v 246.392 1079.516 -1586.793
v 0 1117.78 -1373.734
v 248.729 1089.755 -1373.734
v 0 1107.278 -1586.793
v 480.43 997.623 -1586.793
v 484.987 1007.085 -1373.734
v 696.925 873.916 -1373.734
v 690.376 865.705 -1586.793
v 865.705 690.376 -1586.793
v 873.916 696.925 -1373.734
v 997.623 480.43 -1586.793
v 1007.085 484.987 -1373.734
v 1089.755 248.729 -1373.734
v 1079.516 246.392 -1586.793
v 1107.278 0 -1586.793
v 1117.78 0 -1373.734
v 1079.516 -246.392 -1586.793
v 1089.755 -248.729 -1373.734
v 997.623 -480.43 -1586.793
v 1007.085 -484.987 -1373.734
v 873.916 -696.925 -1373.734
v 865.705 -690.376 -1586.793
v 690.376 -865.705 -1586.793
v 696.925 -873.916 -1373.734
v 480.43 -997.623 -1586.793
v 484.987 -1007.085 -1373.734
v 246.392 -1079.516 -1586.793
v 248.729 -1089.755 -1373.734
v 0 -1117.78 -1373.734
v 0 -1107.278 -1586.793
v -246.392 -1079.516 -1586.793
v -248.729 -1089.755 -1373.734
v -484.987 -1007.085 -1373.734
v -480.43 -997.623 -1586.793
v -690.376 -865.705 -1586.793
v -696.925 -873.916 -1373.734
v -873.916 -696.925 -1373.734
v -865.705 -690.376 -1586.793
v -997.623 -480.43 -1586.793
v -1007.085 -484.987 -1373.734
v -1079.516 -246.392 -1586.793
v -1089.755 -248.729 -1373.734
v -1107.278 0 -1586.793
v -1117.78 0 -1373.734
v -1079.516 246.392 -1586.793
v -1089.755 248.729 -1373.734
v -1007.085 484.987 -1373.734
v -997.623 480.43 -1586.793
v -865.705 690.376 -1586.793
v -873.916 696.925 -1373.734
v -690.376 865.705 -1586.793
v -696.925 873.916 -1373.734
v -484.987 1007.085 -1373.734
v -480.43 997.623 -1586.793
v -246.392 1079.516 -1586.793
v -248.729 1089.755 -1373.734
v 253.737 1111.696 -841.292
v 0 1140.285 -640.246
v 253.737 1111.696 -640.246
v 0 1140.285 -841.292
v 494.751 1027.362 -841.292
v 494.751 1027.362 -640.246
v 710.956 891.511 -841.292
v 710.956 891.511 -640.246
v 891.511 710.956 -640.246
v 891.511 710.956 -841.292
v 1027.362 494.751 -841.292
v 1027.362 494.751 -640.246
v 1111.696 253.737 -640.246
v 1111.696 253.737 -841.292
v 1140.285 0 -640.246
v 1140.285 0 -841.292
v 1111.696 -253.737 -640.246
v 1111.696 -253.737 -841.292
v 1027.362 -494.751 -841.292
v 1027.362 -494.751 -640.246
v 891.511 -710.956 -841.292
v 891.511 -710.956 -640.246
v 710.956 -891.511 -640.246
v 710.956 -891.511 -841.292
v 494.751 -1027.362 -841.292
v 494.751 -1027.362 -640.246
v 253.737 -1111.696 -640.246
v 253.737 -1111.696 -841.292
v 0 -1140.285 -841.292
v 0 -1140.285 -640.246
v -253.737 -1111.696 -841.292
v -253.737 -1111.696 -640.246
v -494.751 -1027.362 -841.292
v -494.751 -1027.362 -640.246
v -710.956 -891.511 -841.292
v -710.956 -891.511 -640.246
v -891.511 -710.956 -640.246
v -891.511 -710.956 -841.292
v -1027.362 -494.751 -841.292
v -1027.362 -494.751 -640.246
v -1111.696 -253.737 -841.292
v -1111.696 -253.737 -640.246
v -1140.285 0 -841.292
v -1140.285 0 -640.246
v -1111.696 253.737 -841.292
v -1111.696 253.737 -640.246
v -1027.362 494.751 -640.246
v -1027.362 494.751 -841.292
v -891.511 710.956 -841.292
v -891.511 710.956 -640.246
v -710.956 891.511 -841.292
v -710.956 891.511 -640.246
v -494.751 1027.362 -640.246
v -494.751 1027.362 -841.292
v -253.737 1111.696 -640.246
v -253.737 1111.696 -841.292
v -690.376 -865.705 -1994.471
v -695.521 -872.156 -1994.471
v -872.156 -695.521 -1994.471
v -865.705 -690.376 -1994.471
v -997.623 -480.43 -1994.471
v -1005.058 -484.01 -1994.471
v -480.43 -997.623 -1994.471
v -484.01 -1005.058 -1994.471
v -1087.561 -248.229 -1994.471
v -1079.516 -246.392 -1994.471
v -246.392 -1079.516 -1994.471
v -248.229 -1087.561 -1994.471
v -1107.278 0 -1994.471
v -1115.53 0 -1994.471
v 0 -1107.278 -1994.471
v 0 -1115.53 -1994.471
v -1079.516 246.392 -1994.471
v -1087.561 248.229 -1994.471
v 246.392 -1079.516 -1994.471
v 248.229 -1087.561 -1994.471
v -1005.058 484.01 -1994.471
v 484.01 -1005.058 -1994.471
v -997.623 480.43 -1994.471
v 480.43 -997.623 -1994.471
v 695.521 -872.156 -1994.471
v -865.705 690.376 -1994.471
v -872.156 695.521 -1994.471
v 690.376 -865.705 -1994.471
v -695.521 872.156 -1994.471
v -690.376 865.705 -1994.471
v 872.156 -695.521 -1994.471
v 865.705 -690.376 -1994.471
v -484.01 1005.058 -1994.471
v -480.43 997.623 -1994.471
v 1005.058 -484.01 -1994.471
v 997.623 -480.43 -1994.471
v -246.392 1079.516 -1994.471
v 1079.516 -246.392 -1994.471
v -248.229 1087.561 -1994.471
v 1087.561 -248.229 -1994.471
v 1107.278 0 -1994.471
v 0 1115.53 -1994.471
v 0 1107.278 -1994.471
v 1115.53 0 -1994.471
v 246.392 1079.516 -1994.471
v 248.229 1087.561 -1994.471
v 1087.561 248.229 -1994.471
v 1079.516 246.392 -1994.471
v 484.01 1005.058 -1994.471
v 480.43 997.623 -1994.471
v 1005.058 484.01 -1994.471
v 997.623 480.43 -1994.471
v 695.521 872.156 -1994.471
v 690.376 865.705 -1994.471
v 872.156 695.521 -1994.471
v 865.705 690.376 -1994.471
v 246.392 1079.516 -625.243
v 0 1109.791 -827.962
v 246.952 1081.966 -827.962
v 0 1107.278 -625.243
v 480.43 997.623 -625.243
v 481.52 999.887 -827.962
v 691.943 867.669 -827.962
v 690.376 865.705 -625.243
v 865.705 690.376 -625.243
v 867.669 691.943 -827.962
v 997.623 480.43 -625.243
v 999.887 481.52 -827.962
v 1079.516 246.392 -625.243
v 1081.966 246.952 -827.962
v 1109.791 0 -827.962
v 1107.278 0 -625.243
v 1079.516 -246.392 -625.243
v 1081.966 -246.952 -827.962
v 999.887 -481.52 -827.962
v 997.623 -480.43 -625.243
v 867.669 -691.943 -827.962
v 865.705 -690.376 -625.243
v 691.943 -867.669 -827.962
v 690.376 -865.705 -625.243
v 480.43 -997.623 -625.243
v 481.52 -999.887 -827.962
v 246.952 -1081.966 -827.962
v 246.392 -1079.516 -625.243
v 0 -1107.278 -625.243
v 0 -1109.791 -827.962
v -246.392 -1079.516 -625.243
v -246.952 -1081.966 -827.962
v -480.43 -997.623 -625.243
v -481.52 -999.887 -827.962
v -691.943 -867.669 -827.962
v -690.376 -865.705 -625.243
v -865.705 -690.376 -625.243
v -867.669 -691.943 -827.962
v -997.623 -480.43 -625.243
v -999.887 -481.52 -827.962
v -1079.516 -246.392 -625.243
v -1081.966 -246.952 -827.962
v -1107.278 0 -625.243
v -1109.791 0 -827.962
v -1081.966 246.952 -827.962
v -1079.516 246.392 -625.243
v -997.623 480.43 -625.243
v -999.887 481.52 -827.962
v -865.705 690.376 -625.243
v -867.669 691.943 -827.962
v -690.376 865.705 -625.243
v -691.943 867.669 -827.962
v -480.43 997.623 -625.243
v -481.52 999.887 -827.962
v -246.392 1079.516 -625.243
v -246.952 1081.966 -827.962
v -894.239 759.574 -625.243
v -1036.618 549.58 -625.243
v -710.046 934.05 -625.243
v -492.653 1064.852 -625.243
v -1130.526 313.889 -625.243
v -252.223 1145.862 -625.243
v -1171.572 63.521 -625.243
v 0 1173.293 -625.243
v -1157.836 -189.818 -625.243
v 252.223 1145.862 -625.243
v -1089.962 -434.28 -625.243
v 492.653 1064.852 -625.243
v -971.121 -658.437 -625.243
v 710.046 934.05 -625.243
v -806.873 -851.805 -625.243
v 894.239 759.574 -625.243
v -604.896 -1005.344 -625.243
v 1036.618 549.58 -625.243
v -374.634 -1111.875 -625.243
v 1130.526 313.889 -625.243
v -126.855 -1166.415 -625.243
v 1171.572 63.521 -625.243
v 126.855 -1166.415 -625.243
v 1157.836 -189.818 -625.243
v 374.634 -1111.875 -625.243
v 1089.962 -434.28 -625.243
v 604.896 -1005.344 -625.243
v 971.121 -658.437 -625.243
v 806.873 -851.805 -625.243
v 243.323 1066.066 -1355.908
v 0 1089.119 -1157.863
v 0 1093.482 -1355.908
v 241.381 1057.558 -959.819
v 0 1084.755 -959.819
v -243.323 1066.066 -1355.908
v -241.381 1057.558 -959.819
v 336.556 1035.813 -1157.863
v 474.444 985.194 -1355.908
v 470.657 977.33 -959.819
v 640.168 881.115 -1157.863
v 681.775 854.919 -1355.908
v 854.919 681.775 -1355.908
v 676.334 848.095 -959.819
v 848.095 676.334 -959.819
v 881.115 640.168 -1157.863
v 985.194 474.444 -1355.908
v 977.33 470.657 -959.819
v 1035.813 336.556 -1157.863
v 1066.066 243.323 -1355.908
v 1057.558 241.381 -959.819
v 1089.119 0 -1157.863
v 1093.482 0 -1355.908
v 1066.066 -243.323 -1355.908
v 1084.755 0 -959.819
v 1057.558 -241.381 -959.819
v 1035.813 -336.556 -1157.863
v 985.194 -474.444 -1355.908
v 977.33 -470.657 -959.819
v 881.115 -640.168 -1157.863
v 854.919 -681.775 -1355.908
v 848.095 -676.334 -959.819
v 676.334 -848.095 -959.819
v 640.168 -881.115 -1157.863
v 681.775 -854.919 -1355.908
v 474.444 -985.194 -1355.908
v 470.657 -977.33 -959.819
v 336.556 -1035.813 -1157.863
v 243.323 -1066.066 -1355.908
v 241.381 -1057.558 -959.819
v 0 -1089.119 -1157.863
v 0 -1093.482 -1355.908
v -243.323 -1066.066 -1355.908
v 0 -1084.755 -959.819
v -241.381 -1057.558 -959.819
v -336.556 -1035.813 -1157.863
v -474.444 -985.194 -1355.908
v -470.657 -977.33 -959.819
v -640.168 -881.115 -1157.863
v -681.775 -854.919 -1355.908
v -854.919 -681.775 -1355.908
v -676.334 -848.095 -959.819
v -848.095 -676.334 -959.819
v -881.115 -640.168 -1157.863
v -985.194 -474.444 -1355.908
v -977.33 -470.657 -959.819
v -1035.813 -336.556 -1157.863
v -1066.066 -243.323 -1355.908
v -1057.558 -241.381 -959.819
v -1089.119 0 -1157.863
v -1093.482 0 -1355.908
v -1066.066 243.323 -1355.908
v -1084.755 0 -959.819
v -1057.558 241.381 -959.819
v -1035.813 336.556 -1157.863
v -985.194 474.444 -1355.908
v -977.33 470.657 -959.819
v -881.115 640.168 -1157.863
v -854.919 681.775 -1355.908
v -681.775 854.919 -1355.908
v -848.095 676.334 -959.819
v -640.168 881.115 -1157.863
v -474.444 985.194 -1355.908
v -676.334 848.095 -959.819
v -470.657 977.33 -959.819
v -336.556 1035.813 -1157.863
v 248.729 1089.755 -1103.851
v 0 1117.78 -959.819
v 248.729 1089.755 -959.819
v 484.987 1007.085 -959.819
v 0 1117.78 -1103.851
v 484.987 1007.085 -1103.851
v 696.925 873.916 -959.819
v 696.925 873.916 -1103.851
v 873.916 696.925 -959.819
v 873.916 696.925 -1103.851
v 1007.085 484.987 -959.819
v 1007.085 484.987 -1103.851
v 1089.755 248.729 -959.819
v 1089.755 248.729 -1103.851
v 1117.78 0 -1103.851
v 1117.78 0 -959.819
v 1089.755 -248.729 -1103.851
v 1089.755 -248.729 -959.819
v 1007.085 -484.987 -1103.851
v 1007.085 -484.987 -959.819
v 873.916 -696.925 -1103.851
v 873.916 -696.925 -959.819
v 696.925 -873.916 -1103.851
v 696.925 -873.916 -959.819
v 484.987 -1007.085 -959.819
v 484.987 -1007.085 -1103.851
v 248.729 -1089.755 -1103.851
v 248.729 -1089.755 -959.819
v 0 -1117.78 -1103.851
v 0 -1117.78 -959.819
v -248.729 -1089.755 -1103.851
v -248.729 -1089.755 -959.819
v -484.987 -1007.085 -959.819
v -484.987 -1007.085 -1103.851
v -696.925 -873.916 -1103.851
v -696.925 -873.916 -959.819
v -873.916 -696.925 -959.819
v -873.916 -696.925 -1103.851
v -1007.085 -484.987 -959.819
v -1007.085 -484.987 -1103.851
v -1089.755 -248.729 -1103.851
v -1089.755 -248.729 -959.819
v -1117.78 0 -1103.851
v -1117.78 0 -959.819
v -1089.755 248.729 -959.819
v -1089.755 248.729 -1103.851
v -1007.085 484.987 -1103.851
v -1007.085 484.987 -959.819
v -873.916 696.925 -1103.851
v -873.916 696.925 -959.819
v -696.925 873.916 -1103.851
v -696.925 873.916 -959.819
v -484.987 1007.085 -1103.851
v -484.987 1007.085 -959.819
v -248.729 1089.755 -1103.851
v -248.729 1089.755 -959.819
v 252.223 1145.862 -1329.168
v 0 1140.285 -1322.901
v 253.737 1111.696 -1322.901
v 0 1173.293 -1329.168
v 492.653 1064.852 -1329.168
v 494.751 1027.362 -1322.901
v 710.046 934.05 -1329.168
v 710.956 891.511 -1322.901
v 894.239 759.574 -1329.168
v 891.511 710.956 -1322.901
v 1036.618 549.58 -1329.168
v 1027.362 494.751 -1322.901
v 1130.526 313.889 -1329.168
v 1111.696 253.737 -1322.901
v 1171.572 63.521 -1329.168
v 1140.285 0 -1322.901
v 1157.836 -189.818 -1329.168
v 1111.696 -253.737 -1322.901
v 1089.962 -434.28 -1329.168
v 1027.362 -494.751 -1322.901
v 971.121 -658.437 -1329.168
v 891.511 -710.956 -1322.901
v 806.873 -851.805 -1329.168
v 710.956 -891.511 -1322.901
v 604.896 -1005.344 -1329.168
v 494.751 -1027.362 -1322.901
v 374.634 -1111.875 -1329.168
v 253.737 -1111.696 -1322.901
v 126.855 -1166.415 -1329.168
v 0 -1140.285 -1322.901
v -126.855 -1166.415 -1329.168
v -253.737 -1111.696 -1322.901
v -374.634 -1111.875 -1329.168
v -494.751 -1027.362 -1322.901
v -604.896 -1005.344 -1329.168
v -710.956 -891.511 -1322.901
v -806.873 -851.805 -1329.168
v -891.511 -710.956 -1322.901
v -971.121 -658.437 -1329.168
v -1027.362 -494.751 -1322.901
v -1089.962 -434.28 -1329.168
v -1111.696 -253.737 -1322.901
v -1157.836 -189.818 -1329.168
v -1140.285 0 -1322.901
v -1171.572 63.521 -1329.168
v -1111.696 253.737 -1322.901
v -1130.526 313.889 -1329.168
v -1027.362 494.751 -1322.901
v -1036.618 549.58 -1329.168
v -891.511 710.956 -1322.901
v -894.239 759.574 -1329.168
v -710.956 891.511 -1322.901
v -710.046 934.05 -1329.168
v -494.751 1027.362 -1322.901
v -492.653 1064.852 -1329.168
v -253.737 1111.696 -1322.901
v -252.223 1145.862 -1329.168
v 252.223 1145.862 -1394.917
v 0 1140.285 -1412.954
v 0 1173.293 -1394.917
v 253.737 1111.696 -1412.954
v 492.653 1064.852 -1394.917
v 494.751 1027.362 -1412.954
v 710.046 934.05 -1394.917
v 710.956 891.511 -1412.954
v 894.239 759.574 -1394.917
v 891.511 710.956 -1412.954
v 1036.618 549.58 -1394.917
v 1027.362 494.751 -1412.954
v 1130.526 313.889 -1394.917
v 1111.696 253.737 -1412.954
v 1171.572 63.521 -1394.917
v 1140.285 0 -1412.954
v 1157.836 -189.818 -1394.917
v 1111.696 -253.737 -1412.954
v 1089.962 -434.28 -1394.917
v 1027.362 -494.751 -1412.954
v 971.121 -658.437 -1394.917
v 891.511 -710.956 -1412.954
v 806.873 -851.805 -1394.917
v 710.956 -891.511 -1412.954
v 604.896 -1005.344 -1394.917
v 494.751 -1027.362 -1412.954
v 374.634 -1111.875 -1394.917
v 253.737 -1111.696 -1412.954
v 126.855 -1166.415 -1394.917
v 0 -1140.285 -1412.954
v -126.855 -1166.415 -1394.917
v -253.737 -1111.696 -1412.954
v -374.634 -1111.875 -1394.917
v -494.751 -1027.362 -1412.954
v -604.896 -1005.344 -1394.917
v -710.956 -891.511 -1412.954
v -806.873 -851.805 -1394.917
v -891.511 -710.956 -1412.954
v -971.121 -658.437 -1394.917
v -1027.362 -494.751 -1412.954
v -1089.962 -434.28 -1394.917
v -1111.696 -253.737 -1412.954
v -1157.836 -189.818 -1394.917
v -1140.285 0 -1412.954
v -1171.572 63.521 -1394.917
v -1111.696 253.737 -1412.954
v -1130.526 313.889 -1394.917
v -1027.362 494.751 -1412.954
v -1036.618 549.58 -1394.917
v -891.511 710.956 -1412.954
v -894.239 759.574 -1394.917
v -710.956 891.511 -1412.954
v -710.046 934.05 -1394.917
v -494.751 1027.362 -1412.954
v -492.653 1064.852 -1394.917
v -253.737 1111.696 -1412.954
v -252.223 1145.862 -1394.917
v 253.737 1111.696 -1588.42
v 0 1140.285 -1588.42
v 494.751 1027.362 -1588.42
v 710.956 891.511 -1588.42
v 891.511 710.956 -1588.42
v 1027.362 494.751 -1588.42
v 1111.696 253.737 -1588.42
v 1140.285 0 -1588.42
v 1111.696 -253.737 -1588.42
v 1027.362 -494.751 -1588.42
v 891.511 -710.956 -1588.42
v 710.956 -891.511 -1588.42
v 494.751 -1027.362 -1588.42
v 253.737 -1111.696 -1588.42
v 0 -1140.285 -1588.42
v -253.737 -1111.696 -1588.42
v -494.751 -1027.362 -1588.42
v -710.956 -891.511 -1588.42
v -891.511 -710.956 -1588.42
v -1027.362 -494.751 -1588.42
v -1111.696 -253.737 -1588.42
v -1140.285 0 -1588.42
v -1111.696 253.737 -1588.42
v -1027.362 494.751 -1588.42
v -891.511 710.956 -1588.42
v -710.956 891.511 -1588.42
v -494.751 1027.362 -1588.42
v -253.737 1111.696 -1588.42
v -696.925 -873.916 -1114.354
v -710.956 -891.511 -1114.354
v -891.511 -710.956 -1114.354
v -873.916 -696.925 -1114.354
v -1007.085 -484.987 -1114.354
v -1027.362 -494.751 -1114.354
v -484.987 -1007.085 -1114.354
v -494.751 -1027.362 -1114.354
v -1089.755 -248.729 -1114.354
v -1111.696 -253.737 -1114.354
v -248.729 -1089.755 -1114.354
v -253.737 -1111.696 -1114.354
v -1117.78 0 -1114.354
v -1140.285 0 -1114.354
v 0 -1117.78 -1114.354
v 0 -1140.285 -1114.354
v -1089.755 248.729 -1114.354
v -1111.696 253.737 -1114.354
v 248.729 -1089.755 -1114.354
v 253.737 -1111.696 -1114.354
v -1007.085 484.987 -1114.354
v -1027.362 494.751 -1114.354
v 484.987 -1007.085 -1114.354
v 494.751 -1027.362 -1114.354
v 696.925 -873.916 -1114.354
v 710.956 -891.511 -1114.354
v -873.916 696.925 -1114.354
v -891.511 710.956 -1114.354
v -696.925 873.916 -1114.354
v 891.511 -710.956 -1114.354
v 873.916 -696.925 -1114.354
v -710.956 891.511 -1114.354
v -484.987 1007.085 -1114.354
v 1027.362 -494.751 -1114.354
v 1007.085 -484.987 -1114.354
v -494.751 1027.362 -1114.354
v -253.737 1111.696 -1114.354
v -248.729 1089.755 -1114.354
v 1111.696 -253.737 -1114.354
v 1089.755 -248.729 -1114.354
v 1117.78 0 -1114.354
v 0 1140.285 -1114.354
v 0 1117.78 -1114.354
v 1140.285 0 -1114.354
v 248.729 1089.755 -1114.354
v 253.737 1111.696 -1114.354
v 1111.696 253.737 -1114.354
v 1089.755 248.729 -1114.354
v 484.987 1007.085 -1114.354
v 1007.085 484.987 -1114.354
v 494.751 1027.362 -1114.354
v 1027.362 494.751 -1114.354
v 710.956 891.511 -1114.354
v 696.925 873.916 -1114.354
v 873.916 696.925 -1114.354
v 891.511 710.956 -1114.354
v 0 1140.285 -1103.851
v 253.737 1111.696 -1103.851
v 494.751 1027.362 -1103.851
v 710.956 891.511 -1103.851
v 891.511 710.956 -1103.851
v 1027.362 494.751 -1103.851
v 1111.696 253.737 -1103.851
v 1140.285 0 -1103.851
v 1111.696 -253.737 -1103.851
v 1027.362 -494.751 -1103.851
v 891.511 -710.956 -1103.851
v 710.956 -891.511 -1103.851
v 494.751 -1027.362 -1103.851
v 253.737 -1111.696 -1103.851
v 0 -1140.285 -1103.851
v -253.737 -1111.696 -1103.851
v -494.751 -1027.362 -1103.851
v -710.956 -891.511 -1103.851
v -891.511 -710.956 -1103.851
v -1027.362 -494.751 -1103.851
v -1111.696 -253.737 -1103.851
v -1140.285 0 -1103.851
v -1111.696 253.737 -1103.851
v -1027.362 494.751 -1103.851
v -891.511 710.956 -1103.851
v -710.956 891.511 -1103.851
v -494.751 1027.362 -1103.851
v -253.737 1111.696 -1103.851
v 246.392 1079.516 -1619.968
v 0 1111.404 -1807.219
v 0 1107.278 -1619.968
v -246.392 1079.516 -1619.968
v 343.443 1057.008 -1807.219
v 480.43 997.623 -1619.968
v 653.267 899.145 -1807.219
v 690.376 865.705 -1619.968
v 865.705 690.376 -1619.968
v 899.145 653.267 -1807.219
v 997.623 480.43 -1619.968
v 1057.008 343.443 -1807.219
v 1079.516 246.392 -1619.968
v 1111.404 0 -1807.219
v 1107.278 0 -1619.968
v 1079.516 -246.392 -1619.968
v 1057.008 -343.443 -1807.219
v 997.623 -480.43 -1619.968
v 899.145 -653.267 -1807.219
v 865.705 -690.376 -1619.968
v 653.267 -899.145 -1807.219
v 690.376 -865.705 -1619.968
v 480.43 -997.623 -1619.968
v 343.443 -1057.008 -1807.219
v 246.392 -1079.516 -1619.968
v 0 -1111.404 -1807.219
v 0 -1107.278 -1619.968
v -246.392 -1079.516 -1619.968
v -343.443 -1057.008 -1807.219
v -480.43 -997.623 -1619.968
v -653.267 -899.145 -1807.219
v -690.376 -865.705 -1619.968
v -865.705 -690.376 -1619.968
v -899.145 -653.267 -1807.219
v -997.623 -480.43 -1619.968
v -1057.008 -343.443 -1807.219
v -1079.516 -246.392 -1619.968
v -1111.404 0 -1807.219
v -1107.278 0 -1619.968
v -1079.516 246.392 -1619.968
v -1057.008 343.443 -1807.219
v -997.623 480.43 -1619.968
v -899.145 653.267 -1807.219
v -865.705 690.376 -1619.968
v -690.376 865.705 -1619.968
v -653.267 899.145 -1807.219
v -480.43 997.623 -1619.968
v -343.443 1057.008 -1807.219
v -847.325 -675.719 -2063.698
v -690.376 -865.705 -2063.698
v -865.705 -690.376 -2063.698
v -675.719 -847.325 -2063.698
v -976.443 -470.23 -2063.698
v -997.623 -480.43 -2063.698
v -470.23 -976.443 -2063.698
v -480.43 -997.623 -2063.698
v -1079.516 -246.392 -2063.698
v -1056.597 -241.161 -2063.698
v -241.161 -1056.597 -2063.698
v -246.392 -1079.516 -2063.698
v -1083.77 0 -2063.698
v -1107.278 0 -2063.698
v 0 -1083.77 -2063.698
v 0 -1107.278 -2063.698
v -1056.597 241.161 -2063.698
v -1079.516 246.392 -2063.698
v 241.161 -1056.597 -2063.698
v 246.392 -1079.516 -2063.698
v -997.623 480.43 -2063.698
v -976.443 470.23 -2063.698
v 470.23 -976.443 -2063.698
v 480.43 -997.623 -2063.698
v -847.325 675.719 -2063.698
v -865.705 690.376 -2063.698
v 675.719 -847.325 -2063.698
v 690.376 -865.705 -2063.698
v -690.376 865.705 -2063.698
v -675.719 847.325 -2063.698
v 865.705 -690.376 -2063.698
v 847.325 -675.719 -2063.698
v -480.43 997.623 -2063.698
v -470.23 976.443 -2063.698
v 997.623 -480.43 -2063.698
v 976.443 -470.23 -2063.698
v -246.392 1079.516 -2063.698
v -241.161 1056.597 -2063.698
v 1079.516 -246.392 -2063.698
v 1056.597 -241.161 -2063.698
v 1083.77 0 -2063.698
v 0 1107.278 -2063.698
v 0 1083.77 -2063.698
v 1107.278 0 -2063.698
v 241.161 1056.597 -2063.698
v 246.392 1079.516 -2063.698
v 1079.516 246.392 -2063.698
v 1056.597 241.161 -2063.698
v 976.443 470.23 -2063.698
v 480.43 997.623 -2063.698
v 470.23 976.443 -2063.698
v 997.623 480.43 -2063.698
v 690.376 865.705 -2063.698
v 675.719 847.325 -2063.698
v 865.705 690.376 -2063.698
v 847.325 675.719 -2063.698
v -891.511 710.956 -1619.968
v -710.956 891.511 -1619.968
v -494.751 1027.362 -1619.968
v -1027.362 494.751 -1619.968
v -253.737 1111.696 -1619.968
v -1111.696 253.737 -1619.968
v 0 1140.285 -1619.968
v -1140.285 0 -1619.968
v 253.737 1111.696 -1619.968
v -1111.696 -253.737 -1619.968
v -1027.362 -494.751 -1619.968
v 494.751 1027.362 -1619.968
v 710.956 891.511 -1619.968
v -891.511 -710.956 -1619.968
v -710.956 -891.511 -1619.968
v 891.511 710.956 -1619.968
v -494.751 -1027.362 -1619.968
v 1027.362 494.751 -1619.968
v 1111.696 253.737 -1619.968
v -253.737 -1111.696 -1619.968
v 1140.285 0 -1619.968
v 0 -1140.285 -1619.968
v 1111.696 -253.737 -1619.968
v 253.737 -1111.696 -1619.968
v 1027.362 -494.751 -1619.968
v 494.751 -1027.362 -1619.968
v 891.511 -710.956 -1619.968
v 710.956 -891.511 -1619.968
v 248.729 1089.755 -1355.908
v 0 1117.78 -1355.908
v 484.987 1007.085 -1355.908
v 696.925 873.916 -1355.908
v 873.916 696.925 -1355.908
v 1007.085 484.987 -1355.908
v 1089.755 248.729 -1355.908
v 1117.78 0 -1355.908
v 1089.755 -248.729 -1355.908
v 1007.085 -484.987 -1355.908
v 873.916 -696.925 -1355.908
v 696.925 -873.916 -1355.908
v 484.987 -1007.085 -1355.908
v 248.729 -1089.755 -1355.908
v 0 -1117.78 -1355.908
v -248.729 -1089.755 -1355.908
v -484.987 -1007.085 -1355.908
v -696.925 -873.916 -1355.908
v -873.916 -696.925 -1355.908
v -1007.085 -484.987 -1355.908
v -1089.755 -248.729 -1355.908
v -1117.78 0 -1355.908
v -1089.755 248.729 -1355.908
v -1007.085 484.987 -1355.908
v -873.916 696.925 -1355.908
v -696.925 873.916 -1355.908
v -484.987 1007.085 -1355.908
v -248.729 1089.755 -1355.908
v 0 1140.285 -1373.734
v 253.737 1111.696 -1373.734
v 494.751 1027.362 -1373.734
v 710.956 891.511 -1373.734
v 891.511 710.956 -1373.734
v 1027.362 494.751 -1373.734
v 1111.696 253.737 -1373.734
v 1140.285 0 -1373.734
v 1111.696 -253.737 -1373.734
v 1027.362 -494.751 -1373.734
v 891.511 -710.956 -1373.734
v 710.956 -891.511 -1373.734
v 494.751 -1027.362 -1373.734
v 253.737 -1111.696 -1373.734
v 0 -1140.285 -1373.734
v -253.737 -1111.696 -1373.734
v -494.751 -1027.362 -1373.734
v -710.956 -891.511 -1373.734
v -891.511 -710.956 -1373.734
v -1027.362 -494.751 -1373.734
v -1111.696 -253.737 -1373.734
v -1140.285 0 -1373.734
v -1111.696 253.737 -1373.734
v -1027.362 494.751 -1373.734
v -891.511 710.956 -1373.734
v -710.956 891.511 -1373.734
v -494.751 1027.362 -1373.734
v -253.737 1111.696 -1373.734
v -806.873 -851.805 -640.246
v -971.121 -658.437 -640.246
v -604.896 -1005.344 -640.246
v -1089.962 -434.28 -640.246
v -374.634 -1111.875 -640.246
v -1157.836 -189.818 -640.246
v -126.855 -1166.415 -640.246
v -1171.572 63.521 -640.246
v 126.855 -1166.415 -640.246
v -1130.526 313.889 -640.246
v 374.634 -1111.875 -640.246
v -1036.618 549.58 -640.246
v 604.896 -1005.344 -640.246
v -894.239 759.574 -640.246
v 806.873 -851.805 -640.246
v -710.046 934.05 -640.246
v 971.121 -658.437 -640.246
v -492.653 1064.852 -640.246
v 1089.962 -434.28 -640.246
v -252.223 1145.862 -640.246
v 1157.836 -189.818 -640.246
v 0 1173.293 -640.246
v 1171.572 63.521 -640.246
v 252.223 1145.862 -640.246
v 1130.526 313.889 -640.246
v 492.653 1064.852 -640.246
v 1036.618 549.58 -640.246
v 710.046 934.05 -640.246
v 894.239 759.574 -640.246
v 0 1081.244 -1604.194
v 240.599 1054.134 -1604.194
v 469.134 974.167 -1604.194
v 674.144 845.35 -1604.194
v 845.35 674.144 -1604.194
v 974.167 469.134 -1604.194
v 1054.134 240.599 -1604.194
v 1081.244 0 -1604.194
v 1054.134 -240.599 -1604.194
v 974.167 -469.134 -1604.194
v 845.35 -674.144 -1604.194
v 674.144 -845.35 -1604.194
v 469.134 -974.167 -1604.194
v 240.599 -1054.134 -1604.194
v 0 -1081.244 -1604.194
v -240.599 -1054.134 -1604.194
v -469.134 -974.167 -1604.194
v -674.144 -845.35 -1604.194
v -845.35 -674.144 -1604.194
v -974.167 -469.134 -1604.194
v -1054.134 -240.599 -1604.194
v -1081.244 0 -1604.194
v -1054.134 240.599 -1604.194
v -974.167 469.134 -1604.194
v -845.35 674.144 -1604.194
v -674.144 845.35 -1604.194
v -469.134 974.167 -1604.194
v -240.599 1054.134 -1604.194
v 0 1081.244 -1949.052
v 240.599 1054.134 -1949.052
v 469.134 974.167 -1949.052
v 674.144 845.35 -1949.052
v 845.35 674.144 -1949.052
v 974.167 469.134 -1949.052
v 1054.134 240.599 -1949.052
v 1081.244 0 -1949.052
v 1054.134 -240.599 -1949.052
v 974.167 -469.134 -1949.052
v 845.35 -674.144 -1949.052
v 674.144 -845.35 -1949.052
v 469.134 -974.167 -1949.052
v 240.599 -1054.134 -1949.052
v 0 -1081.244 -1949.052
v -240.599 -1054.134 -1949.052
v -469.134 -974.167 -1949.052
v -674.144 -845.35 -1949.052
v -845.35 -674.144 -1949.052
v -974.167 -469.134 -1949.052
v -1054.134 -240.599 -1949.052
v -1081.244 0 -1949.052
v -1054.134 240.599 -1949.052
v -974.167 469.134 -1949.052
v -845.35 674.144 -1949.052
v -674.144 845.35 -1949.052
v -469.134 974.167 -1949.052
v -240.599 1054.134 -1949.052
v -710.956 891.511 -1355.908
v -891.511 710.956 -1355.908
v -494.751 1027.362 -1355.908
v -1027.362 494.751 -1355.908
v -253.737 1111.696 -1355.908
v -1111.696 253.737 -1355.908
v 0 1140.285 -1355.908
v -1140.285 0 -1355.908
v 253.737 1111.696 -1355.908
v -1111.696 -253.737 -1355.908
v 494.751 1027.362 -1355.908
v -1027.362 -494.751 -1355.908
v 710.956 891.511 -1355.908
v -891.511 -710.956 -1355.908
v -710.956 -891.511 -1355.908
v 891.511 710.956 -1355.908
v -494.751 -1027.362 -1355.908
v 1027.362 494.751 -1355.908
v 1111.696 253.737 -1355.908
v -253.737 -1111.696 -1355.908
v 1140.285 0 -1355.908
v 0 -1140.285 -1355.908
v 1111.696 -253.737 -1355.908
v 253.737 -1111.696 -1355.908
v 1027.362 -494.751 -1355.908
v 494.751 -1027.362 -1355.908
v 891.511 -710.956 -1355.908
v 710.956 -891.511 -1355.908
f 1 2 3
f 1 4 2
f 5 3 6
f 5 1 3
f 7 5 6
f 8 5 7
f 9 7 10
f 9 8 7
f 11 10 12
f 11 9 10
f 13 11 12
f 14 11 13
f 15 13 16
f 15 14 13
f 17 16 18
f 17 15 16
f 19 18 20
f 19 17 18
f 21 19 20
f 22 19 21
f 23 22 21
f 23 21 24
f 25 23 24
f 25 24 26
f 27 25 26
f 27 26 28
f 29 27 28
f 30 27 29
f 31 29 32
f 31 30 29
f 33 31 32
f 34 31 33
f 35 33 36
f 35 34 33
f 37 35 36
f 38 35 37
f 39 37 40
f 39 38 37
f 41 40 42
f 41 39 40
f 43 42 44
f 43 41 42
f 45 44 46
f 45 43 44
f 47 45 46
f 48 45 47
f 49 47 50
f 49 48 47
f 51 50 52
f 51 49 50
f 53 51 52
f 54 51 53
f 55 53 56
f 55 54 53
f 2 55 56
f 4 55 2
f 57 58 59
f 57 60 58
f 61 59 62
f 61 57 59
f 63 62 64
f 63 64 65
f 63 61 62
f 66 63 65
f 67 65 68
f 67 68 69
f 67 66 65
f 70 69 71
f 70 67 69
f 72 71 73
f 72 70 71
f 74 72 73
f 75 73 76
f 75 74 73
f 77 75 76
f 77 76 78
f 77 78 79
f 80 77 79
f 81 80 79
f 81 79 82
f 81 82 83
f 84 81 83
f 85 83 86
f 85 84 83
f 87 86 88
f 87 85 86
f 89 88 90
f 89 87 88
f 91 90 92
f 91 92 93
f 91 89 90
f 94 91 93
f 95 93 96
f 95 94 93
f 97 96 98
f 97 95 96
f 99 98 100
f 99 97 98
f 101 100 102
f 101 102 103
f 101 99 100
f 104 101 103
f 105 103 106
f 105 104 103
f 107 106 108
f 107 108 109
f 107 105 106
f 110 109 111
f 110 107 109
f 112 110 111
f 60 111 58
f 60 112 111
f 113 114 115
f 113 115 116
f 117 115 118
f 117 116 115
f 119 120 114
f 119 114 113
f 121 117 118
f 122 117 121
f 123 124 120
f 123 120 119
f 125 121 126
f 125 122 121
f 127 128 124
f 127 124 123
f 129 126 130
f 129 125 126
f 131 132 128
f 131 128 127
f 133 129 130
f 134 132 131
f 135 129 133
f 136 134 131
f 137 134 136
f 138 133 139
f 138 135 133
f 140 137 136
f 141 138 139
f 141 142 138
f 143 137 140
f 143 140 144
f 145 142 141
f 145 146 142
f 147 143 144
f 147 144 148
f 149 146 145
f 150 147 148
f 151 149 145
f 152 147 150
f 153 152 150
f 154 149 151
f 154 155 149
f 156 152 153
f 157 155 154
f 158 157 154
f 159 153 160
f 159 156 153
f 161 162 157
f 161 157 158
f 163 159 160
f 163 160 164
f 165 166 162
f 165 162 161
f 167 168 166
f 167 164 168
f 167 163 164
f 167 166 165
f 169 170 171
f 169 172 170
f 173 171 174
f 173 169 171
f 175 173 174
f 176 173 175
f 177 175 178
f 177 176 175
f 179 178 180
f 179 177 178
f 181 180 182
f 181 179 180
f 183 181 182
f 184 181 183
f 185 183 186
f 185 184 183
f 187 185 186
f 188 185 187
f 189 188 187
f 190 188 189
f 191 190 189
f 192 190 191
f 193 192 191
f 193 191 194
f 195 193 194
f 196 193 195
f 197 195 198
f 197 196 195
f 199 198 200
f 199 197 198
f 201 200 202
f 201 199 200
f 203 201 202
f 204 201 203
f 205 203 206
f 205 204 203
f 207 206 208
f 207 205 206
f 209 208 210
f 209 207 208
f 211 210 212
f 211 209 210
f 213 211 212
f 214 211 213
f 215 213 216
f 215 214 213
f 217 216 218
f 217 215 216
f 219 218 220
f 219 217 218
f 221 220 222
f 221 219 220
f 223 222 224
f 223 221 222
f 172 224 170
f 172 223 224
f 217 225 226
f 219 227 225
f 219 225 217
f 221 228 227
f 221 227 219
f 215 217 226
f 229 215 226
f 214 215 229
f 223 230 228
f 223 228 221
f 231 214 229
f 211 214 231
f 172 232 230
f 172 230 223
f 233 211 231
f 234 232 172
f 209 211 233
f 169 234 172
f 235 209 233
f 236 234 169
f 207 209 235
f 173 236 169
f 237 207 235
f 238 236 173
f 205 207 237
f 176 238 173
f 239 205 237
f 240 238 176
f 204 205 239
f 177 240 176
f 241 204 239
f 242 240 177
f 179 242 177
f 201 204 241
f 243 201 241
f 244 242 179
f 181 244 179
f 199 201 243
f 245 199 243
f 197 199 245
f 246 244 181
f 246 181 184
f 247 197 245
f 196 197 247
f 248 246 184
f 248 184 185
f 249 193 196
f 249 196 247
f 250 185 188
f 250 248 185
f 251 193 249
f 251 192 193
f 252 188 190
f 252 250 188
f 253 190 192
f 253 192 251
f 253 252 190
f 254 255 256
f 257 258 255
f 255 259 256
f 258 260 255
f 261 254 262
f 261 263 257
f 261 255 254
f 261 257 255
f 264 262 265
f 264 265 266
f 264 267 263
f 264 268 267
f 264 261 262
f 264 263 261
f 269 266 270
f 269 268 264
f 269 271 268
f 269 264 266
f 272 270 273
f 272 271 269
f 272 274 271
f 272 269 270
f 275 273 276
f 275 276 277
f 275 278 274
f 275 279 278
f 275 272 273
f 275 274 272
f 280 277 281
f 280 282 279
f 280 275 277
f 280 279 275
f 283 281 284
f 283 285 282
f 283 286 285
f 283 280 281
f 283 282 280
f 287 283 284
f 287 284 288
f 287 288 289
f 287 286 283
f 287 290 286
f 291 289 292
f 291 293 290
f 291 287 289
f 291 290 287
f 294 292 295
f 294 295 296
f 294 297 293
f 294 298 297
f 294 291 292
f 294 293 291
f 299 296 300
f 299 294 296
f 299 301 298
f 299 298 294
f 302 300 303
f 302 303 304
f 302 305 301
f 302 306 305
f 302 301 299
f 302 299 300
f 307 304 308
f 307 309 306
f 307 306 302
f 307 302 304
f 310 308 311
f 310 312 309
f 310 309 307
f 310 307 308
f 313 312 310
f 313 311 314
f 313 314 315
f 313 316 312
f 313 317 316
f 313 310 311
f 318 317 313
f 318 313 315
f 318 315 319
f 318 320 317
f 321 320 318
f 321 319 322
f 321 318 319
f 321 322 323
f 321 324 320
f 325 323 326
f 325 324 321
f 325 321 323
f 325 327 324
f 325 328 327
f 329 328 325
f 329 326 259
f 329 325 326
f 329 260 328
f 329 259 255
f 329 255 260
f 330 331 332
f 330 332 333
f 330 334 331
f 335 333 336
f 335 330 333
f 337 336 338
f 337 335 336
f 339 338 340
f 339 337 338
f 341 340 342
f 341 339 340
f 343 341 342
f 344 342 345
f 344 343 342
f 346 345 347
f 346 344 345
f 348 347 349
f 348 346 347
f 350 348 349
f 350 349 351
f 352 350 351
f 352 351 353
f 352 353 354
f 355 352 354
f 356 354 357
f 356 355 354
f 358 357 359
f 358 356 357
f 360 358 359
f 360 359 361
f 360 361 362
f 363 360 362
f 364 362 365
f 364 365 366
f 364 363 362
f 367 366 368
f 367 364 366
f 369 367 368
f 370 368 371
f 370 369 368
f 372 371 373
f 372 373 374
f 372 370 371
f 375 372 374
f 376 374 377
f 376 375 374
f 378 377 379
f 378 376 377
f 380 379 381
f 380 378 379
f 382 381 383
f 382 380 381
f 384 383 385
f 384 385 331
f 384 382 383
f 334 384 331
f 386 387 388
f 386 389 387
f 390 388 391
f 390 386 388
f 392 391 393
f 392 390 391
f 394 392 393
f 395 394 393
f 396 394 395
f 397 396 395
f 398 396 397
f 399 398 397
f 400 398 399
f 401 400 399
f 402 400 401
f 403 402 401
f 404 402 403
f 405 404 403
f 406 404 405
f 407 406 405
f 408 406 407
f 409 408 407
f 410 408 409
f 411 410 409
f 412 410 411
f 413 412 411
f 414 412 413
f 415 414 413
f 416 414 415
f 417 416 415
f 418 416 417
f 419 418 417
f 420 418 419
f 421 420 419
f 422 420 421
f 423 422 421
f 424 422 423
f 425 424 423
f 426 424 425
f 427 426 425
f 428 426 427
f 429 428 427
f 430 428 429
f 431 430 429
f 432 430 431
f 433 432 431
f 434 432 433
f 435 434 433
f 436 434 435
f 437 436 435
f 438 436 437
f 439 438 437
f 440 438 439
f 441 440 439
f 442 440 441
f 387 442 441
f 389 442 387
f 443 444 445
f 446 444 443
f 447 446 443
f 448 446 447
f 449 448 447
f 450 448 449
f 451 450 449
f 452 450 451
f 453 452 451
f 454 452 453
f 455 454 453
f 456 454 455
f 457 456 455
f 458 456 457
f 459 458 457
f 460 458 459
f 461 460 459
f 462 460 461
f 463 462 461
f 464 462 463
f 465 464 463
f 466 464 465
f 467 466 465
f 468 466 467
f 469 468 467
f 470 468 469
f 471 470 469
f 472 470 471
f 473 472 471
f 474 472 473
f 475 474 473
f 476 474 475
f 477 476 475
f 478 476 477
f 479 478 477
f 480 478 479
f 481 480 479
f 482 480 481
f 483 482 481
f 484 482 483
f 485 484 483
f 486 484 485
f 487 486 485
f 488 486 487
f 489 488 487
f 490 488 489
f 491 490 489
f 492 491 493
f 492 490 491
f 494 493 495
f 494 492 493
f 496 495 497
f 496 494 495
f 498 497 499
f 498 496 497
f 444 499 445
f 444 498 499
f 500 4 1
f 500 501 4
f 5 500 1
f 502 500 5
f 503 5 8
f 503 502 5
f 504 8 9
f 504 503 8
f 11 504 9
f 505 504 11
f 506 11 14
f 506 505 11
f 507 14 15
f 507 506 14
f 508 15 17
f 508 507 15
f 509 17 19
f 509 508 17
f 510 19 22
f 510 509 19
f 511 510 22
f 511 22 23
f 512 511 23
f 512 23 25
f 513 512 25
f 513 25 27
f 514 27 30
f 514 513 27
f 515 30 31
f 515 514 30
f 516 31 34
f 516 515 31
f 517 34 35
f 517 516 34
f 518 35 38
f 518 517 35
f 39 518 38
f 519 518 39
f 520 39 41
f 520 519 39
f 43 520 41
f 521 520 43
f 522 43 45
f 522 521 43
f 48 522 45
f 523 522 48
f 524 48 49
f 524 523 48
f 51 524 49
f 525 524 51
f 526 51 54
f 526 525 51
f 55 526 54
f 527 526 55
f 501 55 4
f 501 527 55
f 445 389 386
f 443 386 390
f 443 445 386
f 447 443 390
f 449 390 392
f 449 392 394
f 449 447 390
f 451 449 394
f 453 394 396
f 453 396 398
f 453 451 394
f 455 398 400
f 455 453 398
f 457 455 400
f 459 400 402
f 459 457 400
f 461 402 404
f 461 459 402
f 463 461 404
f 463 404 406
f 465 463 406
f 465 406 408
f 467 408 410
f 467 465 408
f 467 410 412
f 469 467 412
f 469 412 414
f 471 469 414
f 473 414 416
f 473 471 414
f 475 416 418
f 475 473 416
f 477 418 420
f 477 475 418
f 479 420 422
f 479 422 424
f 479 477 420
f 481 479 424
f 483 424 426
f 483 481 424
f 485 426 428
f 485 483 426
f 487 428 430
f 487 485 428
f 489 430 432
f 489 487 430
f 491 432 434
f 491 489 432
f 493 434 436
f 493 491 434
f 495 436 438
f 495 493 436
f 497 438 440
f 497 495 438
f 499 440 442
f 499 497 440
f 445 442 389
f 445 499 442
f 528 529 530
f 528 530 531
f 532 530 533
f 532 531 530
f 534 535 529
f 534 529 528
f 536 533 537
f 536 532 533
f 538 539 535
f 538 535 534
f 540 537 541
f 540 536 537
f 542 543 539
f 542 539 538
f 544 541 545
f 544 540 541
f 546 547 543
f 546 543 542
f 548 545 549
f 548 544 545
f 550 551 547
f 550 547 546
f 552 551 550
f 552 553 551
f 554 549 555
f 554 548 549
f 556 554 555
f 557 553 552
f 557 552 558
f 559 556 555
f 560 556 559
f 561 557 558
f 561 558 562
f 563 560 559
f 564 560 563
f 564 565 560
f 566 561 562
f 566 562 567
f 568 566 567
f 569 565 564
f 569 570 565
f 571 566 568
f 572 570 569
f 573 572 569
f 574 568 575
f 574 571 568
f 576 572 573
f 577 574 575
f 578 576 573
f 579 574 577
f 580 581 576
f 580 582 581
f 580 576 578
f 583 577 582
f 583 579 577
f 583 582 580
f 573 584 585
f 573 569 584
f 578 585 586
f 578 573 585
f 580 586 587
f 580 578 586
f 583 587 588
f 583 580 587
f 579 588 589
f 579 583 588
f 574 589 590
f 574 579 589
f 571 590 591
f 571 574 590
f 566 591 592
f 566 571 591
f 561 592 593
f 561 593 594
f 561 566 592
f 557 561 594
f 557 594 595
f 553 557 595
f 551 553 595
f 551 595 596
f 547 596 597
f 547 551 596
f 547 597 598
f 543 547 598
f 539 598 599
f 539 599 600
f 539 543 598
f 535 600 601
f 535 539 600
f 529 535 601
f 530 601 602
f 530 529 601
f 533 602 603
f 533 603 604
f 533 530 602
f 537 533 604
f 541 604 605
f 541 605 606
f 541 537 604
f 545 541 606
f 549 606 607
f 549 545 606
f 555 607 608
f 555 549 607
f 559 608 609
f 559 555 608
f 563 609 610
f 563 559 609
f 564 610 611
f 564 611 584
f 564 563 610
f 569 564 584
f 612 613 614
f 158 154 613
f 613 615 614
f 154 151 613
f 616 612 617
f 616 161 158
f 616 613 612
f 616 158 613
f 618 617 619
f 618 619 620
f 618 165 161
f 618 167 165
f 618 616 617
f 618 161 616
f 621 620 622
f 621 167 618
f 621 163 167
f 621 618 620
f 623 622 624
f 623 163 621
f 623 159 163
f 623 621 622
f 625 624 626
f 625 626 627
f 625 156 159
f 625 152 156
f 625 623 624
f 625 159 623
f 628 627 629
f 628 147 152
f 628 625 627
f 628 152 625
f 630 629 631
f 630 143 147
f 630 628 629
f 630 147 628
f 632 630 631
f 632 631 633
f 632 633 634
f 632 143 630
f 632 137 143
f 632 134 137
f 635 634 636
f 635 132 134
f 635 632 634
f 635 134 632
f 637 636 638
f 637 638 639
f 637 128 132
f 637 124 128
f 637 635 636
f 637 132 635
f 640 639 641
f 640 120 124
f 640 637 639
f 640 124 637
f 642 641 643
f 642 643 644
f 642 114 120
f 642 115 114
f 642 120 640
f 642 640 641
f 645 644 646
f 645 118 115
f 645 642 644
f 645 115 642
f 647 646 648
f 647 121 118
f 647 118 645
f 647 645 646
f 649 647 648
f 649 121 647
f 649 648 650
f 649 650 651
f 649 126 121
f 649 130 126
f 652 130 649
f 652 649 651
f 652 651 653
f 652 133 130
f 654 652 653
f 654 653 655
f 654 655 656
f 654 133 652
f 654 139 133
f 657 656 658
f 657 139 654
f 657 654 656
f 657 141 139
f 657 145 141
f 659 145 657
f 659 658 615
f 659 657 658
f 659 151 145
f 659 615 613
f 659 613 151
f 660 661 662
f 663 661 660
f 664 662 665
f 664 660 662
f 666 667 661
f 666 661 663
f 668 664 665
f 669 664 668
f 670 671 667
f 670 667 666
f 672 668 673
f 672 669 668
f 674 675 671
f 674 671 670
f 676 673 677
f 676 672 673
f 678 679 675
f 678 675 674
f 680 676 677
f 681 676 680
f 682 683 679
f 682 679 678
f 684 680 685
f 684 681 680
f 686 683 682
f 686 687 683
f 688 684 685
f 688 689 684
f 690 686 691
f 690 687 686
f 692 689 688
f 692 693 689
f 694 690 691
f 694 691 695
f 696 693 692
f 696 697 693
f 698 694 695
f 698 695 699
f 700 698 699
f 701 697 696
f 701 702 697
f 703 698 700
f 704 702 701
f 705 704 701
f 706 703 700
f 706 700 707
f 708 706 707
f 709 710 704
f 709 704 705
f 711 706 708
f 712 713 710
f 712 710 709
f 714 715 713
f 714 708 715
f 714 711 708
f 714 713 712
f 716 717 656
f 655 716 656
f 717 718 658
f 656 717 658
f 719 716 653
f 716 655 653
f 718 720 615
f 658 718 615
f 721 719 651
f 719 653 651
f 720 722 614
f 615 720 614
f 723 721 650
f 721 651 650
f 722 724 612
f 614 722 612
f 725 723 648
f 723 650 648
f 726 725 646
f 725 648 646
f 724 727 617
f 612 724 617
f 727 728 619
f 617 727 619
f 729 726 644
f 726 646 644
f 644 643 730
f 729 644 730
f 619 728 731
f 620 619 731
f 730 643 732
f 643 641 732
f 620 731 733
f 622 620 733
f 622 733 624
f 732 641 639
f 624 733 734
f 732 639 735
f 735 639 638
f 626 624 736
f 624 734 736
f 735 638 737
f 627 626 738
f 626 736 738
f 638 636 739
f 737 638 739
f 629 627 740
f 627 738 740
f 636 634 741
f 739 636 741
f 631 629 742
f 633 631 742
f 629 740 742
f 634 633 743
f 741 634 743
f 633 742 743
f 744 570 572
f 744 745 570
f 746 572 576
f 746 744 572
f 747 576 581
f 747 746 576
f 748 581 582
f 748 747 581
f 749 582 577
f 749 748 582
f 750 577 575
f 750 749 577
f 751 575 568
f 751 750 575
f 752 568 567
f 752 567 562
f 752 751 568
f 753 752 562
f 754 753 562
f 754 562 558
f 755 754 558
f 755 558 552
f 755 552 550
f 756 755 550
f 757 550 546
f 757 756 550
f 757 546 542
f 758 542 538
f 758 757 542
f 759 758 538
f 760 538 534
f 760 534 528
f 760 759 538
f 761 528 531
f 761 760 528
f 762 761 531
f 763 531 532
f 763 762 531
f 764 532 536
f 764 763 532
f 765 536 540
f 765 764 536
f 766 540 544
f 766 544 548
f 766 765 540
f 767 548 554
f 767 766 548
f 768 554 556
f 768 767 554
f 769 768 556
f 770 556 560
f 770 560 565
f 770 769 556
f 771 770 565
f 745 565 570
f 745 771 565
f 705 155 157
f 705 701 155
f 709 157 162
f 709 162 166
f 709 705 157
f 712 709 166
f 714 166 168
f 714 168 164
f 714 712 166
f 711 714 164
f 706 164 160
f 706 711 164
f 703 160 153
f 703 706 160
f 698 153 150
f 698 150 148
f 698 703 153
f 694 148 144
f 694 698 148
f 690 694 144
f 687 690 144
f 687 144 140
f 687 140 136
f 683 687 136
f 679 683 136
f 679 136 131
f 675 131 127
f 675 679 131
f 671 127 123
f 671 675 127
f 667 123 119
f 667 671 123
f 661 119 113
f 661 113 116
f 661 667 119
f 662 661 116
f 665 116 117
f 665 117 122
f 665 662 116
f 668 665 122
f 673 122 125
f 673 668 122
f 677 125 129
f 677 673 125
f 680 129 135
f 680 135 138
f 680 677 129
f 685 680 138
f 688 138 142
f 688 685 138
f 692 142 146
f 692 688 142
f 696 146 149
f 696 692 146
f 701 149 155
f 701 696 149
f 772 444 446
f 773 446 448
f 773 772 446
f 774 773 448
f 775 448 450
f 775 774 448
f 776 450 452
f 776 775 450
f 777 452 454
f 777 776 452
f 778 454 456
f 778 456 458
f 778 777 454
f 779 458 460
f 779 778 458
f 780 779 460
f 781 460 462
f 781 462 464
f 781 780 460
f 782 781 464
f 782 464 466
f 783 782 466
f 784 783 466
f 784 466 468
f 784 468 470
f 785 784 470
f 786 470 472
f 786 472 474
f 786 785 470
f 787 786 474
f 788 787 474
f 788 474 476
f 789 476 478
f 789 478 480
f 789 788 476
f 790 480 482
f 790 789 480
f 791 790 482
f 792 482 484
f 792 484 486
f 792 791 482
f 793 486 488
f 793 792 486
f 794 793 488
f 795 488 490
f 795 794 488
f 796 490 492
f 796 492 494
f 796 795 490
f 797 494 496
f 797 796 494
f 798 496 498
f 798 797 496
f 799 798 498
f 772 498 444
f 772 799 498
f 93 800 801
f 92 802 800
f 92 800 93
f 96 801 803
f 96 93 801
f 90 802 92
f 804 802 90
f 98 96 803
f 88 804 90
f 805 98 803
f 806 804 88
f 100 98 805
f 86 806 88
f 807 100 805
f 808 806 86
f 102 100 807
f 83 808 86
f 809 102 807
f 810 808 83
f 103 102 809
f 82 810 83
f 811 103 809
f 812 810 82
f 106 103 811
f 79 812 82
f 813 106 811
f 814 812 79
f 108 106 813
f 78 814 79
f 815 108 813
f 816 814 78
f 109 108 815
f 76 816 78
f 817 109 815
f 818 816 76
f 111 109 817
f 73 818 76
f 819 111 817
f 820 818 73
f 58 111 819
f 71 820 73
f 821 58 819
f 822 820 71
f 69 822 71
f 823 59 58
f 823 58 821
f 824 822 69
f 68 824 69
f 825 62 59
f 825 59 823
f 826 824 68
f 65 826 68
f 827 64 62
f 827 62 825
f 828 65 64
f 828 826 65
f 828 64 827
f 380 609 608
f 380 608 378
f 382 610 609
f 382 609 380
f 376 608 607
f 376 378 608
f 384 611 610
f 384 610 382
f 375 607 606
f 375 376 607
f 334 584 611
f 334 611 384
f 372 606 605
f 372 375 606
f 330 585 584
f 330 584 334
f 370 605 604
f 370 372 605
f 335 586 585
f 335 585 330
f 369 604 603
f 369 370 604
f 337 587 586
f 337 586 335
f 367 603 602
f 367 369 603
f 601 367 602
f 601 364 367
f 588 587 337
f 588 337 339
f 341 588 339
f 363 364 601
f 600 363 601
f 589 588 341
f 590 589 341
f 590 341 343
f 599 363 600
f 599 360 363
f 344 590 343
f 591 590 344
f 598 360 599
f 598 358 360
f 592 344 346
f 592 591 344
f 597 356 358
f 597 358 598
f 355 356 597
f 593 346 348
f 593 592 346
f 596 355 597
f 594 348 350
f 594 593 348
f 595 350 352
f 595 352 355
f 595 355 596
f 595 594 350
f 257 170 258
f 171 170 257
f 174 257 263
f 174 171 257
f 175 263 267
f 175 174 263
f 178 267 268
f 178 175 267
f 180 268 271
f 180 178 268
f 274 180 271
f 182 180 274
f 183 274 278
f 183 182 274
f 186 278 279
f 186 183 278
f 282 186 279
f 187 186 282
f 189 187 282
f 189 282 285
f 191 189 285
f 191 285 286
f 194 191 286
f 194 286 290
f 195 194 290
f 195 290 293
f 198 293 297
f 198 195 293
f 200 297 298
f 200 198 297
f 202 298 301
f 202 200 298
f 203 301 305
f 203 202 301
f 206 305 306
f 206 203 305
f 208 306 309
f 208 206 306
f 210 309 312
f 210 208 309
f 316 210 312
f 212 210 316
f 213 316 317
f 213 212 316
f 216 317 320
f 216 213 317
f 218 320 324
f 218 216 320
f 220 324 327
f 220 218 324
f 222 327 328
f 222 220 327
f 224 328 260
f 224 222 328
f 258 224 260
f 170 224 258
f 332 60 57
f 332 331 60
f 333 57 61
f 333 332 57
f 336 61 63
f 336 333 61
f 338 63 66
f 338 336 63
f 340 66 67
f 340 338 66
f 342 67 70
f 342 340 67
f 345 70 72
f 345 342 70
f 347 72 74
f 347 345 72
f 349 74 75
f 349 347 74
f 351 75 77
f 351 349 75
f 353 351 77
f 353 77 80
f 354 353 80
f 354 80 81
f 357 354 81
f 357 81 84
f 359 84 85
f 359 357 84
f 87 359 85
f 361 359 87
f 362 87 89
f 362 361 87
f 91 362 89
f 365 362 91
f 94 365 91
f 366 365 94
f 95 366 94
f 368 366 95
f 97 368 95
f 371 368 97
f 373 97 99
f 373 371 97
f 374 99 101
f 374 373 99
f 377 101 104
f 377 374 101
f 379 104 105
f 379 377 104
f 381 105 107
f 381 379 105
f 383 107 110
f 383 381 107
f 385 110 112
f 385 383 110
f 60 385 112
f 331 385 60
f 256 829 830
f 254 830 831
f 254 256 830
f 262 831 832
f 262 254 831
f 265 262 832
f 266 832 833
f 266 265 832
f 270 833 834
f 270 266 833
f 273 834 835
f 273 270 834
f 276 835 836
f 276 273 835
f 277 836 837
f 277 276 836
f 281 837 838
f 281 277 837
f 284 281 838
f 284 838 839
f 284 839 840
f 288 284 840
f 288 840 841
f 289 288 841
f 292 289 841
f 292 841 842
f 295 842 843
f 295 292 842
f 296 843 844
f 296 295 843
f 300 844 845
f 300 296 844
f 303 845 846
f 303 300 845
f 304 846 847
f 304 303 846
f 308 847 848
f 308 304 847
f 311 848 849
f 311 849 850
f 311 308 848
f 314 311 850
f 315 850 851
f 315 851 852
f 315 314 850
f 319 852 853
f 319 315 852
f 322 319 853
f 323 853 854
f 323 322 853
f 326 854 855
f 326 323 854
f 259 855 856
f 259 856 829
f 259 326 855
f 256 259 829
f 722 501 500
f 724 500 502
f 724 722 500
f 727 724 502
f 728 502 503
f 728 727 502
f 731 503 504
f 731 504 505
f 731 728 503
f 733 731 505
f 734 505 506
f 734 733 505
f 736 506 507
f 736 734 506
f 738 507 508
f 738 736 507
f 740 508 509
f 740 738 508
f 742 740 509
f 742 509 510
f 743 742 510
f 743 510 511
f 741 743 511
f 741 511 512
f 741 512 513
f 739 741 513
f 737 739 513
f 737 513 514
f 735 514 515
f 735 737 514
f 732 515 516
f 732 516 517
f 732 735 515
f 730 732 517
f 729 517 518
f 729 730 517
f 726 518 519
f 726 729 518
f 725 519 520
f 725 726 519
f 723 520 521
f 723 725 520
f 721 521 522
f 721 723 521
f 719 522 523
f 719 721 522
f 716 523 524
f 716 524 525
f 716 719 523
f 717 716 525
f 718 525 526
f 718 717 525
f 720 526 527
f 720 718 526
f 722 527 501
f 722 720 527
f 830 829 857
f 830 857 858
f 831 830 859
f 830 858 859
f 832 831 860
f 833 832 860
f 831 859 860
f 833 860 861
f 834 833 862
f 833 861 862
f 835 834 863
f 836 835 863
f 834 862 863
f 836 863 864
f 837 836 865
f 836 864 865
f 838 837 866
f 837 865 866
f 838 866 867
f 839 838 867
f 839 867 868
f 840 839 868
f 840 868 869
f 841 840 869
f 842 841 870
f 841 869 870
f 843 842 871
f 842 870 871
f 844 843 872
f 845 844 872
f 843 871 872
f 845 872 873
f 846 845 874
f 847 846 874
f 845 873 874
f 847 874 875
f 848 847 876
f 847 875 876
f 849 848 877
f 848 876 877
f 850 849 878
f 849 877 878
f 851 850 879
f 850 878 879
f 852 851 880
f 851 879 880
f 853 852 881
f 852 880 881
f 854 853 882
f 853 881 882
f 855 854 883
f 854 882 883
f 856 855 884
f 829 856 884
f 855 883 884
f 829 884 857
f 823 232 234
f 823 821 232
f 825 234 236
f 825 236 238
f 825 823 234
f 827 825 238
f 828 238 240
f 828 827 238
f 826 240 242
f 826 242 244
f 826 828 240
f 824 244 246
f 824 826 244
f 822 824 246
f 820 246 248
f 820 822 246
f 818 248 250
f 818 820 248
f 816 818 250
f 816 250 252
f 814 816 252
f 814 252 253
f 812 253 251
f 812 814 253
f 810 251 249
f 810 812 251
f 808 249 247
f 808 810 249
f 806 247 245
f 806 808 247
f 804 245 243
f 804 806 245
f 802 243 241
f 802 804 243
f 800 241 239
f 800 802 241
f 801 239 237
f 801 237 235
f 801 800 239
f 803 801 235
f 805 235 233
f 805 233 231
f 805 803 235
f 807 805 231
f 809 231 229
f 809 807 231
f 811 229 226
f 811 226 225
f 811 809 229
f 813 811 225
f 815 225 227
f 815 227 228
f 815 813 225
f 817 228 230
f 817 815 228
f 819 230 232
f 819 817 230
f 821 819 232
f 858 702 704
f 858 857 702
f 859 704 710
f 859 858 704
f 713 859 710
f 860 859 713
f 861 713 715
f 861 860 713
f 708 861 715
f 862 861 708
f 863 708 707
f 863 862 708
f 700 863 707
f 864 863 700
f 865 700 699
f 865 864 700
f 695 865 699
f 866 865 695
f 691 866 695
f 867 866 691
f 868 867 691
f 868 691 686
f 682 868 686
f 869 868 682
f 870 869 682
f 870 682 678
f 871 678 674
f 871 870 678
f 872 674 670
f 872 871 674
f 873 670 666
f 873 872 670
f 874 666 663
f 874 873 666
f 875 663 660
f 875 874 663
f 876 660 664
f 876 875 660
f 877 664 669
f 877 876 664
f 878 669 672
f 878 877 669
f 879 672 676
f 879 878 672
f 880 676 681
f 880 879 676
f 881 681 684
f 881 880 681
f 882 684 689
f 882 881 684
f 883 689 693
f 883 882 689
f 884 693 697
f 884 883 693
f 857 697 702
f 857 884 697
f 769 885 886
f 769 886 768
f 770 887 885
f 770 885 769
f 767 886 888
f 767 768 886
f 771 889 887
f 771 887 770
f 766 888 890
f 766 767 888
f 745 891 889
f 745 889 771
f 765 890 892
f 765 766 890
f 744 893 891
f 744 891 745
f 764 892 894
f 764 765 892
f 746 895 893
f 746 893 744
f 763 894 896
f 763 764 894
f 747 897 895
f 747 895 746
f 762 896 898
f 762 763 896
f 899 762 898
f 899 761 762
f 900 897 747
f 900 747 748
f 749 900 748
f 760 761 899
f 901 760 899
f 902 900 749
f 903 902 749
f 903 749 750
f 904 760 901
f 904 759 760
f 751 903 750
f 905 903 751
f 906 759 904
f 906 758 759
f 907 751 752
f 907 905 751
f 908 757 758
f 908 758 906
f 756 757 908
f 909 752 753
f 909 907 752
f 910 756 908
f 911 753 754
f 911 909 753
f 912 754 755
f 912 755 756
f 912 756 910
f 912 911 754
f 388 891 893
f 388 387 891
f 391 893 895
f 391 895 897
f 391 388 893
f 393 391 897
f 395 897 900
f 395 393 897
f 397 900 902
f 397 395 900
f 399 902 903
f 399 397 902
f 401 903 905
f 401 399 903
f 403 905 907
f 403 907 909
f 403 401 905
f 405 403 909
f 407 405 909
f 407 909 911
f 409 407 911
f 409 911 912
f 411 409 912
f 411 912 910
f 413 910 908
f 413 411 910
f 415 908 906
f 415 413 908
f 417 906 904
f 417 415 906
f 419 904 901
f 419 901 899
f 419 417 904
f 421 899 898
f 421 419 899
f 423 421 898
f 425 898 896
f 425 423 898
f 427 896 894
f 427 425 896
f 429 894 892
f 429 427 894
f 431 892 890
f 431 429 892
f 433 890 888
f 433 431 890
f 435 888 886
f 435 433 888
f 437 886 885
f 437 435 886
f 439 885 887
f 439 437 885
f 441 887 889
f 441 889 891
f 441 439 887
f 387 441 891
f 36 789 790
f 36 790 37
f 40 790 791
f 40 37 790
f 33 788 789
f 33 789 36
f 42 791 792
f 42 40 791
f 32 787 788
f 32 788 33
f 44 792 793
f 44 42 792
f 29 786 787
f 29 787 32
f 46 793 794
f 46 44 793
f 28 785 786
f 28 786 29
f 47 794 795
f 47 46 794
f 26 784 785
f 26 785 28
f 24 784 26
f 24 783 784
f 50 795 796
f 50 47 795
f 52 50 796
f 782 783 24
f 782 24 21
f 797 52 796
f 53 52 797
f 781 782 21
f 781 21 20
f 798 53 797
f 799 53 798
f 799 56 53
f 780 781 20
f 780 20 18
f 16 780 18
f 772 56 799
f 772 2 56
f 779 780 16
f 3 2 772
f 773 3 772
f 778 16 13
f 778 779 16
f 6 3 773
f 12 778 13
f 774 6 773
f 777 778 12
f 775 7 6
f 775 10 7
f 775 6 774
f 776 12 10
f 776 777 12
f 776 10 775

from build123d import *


with BuildPart() as part:
    # Sketch3 → Revolve1 (revolve)
    with BuildSketch(Plane(origin=(0, 0, 0), x_dir=(0, 0, -1), z_dir=(1, 0, 0))):
        Polygon((625.243112709, 1107.27781024), (625.243112709, 1173.292710159), (640.246499054, 1173.292710159), (640.246499054, 1140.2852602), (841.291876078, 1140.2852602), (959.818628204, 1117.780180682), (1103.851137117, 1117.780180682), (1103.851137117, 1140.2852602), (1114.353507559, 1140.2852602), (1114.353507559, 1117.780180682), (1355.908027715, 1117.780180682), (1355.908027715, 1140.2852602), (1322.900577755, 1140.2852602), (1329.167815089, 1173.292710159), (1394.916832212, 1173.292710159), (1412.953814648, 1140.2852602), (1373.733715244, 1140.2852602), (1373.733715244, 1117.780180682), (1586.7930511, 1107.27781024), (1588.420093001, 1140.2852602), (1619.967627388, 1140.2852602), (1619.967627388, 1123.78153522), (1619.967627388, 1107.27781024), (1994.47135604, 1115.52967273), (1994.47135604, 1107.27781024), (2063.698238778, 1107.27781024), (2063.698238778, 1083.769640902), (1949.05197346, 1081.243510602), (1903.269357476, 1081.243510602), (1604.193860195, 1081.243510602), (1355.908027715, 1093.482306793), (959.818628204, 1084.754822903), (827.962379457, 1109.790819501), align=None)
    revolve(axis=Axis((0, 0, 0), (0, 0, -1)))


solid = part.part
